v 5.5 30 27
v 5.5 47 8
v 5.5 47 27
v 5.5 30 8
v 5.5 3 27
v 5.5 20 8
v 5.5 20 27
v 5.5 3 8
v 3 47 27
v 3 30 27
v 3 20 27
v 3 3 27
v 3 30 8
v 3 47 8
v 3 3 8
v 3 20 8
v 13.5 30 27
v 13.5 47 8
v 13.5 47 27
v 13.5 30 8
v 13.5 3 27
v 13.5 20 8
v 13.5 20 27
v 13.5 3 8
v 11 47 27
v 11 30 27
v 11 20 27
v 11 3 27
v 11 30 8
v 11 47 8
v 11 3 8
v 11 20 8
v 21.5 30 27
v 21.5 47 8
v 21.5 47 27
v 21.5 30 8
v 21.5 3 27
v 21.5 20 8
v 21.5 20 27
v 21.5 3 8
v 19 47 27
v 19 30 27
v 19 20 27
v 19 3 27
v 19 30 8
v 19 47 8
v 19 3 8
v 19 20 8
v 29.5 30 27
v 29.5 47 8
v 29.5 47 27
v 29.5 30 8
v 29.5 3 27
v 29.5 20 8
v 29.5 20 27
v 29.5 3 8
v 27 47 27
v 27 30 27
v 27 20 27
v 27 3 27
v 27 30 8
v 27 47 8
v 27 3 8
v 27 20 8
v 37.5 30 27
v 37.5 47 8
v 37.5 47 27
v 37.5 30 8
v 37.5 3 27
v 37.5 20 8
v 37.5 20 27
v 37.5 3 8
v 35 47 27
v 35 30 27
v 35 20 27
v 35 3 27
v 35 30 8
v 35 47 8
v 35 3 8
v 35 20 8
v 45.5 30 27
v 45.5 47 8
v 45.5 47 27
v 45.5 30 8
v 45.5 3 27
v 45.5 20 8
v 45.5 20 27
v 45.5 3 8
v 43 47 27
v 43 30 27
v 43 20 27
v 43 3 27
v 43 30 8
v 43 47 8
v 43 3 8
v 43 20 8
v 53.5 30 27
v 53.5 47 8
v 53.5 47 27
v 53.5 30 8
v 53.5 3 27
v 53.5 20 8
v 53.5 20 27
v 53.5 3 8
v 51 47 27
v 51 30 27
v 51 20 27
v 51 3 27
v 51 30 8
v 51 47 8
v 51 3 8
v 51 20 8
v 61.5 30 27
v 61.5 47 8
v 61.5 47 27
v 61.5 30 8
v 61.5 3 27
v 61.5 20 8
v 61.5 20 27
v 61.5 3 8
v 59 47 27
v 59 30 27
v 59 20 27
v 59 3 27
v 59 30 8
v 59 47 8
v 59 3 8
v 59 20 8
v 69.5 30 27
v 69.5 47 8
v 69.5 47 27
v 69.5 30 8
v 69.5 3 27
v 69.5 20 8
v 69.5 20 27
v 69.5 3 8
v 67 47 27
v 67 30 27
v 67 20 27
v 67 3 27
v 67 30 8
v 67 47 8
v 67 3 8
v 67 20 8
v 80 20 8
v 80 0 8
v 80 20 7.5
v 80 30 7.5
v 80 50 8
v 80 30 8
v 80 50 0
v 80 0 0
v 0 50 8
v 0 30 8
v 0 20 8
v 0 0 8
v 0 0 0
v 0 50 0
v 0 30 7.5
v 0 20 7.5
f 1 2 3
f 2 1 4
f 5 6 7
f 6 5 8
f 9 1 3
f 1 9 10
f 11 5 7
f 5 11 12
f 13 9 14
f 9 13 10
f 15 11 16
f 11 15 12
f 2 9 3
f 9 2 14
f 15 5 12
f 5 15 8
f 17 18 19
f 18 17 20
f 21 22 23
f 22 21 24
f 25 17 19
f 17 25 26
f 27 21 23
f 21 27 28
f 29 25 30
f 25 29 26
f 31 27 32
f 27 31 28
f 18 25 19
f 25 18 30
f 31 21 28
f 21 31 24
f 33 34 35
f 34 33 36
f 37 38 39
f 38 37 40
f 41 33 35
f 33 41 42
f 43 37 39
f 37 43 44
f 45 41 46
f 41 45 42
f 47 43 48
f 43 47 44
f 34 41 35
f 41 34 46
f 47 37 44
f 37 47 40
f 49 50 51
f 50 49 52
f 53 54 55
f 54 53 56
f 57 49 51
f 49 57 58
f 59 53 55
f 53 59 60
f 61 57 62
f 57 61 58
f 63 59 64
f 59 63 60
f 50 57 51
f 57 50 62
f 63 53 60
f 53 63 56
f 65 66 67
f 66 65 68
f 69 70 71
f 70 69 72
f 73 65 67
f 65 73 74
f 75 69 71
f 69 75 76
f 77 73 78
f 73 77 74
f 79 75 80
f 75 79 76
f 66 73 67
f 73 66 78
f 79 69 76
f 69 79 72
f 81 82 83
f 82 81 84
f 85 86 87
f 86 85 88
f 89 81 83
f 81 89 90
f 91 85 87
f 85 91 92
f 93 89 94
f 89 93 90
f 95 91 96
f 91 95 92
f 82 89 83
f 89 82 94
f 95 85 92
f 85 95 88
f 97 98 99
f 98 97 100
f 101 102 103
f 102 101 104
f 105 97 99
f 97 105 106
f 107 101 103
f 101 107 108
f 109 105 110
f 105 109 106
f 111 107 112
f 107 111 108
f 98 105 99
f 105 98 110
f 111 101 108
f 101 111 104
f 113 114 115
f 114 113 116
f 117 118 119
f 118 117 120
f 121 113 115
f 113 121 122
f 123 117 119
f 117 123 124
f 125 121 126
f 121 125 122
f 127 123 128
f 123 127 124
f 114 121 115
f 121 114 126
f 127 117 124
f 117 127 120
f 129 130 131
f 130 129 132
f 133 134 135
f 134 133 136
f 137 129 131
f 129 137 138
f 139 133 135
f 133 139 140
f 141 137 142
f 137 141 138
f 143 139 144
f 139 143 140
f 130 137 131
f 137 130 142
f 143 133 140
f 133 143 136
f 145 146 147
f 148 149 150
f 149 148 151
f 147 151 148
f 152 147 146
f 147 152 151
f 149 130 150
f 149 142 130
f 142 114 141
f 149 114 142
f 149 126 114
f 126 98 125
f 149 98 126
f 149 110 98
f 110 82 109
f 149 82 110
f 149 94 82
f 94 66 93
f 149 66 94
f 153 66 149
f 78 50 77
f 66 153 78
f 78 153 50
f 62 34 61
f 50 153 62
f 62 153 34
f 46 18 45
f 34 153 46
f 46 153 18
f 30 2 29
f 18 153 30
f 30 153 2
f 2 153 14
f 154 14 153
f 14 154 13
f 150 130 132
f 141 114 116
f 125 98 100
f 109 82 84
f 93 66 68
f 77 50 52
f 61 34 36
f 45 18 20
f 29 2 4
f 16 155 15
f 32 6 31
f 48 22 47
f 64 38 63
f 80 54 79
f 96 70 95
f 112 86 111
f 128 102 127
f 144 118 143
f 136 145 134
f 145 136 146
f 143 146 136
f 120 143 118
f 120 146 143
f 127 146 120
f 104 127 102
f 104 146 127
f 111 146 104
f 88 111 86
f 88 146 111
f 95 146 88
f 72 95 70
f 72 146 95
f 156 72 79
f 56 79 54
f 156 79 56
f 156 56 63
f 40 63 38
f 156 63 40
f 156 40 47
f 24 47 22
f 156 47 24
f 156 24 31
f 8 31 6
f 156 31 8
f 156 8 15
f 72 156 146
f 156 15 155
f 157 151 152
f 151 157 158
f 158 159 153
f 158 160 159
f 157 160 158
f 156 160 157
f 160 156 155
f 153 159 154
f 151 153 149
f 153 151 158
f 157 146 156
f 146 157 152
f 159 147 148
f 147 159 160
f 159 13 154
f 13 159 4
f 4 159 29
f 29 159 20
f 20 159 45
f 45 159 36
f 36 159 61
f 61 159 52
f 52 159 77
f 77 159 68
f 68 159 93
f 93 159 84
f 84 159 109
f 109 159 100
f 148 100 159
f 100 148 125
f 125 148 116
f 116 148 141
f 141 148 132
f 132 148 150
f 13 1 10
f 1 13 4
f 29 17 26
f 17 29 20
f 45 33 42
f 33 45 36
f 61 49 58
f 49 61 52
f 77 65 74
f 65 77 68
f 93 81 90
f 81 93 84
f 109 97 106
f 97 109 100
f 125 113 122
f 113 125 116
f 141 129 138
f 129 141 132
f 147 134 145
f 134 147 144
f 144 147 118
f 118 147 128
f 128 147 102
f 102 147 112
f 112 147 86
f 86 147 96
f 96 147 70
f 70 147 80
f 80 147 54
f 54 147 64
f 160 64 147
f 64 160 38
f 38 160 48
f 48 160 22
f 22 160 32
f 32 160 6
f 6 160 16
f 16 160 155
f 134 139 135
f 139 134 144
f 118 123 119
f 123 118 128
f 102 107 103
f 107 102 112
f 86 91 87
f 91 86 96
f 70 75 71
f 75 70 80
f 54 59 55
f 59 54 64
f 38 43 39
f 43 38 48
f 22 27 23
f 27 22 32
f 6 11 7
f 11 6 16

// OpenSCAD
$fn = 32;

// ----------------------------------------------------------------------
// Heatsink: slotted fin block
// ----------------------------------------------------------------------

// --- parameters (mm) ---
base_l = 80;              // base length, X
base_w = 50;              // base width, Y
base_t = 8;               // base plate thickness
fin_h = 20;               // fin height above the base
fin_t = 2.5;              // fin thickness
edge = 3;                 // margin from the base ends
pitch = 8;                // fin pitch
slot_w = 10;              // central slot width, Y

n_fins = floor((base_l - 2 * edge - fin_t) / pitch) + 1;  // fin count
total_h = base_t + fin_h - 1;  // overall height

difference() {
union() {
  cube([base_l, base_w, base_t]);
  for (i = [0 : n_fins - 1])
    translate([edge + i * pitch, edge, base_t - 1])
      cube([fin_t, base_w - 2 * edge, fin_h]);
}
  translate([-1, base_w / 2 - slot_w / 2, base_t - 0.5])
    cube([base_l + 2, slot_w, fin_h + 2]);
}
